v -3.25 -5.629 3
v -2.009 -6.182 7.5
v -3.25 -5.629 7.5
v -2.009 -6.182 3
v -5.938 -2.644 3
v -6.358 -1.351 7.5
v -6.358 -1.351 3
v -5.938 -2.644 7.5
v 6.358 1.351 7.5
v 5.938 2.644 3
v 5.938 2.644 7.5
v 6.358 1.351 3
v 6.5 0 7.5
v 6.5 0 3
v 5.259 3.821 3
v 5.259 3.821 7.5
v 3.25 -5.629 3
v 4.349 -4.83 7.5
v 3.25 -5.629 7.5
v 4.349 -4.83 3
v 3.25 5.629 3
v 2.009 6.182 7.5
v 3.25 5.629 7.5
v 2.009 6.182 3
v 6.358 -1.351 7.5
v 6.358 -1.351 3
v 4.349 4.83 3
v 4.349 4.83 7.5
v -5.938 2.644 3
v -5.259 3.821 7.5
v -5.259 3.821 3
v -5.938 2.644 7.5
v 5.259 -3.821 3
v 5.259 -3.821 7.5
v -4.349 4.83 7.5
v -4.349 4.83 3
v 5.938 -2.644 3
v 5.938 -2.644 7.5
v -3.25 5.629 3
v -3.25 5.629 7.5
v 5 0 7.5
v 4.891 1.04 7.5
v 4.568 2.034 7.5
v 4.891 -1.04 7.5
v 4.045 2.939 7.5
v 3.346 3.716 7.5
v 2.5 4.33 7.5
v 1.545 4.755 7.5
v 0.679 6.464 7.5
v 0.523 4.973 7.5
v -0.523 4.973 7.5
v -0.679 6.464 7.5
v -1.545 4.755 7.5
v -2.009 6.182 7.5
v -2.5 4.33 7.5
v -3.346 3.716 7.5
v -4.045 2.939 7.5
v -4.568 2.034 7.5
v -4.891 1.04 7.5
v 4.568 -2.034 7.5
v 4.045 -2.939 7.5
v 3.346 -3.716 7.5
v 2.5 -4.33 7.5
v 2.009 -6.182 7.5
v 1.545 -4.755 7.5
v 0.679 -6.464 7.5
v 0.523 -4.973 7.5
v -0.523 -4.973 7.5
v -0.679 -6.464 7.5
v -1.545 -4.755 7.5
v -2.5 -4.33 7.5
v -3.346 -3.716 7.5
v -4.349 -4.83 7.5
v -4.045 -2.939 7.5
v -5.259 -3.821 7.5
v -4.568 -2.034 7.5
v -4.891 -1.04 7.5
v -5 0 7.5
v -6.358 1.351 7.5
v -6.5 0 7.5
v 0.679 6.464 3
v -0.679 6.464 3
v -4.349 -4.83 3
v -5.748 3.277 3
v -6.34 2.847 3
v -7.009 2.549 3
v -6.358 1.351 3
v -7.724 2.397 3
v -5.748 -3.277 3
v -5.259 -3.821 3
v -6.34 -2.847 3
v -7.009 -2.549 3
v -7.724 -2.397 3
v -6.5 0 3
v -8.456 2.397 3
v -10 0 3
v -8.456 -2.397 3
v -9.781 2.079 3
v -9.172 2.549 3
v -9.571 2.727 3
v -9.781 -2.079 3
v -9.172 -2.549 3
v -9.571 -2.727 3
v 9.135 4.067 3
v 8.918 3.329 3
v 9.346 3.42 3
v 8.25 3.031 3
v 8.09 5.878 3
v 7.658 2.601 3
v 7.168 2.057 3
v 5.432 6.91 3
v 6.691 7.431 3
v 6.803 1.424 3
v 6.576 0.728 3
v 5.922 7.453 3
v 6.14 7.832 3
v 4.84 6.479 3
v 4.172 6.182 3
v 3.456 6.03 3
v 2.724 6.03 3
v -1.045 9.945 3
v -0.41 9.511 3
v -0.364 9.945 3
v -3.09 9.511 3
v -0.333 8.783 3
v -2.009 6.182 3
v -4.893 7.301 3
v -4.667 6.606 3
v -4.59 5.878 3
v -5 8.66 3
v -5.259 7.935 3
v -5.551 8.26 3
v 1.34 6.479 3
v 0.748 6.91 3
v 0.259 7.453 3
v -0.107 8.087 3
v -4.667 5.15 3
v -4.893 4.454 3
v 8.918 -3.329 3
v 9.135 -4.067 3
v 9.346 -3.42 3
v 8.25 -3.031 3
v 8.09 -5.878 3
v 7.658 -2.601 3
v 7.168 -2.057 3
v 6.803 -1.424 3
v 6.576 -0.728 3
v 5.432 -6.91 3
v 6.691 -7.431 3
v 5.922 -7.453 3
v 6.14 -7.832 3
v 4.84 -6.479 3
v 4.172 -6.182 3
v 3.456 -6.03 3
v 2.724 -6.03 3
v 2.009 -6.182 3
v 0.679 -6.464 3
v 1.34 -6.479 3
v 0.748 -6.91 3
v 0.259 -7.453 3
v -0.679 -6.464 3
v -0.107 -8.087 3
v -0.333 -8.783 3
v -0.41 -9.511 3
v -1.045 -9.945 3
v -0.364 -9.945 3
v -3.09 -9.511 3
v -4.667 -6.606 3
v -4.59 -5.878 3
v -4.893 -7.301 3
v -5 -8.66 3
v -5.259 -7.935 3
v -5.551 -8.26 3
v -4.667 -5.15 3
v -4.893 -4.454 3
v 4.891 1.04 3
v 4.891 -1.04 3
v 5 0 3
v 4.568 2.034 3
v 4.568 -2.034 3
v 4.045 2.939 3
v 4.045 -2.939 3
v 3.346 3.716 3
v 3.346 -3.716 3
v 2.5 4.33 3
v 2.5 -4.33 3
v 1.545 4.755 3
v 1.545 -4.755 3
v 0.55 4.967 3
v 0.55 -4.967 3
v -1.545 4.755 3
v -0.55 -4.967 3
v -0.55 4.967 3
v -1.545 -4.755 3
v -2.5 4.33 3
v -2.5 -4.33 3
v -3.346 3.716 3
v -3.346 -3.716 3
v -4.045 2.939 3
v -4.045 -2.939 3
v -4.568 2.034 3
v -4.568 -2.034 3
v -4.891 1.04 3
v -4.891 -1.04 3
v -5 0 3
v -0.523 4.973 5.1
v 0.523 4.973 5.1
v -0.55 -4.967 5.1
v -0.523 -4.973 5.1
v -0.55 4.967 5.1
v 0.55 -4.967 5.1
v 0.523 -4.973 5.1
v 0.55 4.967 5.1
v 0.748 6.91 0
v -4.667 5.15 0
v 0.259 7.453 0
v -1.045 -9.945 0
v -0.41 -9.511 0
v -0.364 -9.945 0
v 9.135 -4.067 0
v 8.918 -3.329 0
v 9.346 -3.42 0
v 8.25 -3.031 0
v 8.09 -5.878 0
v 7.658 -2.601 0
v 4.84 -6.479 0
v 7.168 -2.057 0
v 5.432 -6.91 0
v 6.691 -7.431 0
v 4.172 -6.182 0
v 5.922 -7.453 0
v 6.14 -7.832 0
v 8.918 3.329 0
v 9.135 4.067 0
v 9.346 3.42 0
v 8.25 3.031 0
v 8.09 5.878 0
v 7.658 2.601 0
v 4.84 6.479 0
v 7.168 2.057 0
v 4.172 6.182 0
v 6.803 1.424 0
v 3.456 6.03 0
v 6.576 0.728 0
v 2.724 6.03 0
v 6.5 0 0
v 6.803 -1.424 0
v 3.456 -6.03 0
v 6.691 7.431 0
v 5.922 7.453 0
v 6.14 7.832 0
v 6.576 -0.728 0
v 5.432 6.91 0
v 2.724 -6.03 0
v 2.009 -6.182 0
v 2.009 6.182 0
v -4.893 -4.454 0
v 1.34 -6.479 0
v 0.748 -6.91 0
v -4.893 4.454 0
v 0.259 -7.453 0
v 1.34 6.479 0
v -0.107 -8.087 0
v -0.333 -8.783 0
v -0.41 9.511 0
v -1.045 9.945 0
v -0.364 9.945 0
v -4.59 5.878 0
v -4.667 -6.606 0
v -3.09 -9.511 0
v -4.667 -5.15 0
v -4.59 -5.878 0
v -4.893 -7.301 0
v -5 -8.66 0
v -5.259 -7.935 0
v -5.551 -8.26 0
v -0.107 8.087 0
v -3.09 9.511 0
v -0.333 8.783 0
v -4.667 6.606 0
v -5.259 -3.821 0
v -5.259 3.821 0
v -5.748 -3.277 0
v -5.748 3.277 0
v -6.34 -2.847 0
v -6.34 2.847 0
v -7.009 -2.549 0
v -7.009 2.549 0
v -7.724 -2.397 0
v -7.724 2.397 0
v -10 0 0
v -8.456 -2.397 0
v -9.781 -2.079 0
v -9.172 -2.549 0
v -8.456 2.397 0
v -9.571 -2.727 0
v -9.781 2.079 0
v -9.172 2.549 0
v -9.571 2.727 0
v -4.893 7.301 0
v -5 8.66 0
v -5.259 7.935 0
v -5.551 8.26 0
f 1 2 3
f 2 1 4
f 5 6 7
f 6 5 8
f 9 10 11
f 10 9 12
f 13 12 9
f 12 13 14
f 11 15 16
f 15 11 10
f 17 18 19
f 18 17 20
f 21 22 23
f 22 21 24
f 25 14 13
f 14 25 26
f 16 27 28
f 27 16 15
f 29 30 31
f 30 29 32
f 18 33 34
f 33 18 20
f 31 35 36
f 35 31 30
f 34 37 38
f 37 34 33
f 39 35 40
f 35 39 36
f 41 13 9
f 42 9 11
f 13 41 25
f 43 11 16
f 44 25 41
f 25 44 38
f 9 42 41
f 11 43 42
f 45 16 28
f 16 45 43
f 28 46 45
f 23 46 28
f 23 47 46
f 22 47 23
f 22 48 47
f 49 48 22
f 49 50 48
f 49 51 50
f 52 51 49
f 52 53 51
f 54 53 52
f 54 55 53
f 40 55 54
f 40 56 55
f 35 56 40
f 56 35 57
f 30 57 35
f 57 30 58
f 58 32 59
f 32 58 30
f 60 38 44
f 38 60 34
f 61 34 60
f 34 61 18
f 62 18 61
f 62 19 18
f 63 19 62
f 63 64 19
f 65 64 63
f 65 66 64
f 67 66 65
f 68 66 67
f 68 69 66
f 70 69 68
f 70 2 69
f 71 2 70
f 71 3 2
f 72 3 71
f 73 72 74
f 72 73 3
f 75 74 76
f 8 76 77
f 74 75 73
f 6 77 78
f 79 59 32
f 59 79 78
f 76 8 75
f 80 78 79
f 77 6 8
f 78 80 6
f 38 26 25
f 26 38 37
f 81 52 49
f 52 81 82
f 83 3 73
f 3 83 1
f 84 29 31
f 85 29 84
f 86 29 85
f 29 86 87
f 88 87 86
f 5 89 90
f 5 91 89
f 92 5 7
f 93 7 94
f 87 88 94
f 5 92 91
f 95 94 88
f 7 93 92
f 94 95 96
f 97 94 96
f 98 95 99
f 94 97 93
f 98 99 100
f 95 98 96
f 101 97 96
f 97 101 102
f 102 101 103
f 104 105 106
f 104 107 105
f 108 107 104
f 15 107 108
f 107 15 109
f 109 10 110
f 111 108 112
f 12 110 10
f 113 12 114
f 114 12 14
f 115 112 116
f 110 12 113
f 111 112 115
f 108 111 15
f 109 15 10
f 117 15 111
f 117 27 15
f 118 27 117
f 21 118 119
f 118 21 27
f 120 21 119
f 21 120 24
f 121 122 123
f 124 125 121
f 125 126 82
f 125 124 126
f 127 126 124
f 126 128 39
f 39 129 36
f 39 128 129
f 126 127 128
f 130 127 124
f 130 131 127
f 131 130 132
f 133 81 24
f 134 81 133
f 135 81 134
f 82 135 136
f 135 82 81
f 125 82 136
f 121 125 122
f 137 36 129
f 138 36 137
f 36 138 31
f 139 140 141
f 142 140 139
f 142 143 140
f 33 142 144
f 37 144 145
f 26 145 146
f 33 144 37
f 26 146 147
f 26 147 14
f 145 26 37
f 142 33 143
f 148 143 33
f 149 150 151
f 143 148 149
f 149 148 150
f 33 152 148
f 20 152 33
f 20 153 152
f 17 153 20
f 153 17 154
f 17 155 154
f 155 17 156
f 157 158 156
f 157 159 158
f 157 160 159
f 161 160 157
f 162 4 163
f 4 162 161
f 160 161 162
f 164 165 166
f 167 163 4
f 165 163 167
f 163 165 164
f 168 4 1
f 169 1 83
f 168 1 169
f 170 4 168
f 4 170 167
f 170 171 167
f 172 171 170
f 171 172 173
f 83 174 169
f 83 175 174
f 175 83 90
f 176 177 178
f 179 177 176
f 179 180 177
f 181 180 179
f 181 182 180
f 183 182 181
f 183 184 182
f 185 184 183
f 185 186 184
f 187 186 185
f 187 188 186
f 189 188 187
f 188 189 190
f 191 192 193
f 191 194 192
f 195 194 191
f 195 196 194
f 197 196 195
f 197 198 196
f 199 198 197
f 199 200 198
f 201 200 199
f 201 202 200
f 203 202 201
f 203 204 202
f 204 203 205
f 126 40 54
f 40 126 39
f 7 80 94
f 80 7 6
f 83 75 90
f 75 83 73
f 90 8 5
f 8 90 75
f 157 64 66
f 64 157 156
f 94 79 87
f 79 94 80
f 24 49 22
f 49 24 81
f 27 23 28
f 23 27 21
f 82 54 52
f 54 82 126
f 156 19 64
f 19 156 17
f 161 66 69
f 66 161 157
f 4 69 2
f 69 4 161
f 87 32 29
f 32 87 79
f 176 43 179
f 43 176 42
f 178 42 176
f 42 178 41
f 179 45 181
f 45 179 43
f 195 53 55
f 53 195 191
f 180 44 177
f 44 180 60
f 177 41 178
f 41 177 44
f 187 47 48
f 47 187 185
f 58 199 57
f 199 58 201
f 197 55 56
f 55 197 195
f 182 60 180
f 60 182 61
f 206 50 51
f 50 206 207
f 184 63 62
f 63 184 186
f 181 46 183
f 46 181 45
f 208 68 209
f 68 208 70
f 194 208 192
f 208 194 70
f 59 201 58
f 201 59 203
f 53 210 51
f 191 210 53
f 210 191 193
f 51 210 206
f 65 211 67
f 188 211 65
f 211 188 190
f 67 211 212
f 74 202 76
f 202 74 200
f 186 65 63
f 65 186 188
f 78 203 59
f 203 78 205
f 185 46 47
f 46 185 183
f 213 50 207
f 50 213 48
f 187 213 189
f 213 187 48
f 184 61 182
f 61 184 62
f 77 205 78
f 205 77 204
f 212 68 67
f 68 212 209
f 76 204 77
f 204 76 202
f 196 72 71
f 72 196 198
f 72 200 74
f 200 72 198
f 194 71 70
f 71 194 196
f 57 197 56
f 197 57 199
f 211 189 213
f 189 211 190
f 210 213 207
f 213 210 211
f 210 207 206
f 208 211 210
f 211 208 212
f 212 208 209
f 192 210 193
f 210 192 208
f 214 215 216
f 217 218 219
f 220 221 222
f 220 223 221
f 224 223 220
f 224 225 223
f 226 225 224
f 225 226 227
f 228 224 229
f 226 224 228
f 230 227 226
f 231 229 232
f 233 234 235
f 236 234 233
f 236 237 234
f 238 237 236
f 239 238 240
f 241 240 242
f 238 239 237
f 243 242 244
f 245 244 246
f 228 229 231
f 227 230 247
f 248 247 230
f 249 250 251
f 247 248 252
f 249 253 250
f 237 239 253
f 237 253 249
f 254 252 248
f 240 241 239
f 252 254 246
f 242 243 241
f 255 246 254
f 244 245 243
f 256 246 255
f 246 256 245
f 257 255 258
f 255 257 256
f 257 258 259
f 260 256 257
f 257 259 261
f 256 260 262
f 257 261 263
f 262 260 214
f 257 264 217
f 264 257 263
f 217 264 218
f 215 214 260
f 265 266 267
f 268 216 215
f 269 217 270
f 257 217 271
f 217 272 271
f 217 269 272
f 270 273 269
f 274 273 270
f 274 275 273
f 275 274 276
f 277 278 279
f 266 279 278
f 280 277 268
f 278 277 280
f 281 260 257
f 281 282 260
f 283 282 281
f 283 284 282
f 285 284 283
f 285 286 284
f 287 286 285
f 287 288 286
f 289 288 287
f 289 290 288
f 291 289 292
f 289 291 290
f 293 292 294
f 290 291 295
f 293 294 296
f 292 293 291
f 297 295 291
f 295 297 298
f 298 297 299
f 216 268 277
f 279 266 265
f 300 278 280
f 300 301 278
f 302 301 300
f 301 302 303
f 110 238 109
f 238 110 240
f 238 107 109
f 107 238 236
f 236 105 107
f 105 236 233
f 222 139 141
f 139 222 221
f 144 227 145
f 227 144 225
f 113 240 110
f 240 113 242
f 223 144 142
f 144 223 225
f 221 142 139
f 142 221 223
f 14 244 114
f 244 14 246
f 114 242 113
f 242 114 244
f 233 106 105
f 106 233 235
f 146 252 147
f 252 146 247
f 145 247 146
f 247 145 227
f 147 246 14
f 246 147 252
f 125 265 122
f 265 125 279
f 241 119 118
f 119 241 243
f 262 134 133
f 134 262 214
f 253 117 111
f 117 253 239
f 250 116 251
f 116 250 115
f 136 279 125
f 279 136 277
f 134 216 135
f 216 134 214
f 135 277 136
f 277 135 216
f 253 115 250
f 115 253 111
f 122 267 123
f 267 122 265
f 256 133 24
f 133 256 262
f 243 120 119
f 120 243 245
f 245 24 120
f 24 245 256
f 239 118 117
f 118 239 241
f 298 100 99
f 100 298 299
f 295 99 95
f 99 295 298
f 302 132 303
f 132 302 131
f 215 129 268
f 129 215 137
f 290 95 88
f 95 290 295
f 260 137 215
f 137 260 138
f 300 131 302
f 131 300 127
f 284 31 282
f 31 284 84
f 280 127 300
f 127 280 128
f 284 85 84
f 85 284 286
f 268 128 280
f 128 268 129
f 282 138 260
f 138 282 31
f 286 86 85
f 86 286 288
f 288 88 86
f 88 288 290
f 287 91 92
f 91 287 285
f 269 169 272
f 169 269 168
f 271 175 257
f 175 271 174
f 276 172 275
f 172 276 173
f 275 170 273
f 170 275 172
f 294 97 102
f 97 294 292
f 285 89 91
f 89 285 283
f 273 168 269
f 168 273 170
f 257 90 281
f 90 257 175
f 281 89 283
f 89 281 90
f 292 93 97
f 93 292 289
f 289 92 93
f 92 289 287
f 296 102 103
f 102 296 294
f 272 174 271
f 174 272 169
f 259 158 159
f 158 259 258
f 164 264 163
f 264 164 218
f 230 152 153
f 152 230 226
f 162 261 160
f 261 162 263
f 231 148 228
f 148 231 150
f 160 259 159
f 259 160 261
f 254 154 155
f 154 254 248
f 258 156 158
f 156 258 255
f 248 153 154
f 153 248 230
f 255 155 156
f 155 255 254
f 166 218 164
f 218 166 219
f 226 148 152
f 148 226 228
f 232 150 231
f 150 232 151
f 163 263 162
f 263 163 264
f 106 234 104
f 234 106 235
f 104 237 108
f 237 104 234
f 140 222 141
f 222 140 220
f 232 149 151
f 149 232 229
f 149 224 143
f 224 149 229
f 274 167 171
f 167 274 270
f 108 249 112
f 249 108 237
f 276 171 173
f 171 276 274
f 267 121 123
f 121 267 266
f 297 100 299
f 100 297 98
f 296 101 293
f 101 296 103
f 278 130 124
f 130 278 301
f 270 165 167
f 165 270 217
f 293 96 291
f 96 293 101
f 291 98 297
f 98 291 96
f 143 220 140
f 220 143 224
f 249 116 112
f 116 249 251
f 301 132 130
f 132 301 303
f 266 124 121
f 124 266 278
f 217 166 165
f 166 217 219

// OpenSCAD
/*
 * Created by:
 * Thomas Buck <xythobuz@xythobuz.de> in April 2016
 *
 * Licensed under the Creative Commons - Attribution license.
 */

diameter = 10;
slit = 1.1;
slit_height = 2.1;
height = 4.5;
wall = 1.5;
base_size = 20;
base_height = 3;
cut_out_count = 5;
cut_out_factor = 0.35;
$fn = 30;

// -----------------------------------------------------------

translate([0, 0, base_height])
union() {
    difference() {
        cylinder(d = diameter + (2 * wall), h = height);
        cylinder(d = diameter, h = height);
    }

    translate([-(slit / 2), -(diameter / 2), 0])
        cube([slit, diameter, slit_height]);
}

difference() {
    cylinder(d = base_size, h = base_height);
    
    // cut outs for fingers
    for (i = [0 : cut_out_count]) {
        rotate([0, 0, (360 / cut_out_count) * i])
            translate([(base_size / 2), 0, 0])
            cylinder(d = base_size * cut_out_factor, h = base_height);
    }
}
